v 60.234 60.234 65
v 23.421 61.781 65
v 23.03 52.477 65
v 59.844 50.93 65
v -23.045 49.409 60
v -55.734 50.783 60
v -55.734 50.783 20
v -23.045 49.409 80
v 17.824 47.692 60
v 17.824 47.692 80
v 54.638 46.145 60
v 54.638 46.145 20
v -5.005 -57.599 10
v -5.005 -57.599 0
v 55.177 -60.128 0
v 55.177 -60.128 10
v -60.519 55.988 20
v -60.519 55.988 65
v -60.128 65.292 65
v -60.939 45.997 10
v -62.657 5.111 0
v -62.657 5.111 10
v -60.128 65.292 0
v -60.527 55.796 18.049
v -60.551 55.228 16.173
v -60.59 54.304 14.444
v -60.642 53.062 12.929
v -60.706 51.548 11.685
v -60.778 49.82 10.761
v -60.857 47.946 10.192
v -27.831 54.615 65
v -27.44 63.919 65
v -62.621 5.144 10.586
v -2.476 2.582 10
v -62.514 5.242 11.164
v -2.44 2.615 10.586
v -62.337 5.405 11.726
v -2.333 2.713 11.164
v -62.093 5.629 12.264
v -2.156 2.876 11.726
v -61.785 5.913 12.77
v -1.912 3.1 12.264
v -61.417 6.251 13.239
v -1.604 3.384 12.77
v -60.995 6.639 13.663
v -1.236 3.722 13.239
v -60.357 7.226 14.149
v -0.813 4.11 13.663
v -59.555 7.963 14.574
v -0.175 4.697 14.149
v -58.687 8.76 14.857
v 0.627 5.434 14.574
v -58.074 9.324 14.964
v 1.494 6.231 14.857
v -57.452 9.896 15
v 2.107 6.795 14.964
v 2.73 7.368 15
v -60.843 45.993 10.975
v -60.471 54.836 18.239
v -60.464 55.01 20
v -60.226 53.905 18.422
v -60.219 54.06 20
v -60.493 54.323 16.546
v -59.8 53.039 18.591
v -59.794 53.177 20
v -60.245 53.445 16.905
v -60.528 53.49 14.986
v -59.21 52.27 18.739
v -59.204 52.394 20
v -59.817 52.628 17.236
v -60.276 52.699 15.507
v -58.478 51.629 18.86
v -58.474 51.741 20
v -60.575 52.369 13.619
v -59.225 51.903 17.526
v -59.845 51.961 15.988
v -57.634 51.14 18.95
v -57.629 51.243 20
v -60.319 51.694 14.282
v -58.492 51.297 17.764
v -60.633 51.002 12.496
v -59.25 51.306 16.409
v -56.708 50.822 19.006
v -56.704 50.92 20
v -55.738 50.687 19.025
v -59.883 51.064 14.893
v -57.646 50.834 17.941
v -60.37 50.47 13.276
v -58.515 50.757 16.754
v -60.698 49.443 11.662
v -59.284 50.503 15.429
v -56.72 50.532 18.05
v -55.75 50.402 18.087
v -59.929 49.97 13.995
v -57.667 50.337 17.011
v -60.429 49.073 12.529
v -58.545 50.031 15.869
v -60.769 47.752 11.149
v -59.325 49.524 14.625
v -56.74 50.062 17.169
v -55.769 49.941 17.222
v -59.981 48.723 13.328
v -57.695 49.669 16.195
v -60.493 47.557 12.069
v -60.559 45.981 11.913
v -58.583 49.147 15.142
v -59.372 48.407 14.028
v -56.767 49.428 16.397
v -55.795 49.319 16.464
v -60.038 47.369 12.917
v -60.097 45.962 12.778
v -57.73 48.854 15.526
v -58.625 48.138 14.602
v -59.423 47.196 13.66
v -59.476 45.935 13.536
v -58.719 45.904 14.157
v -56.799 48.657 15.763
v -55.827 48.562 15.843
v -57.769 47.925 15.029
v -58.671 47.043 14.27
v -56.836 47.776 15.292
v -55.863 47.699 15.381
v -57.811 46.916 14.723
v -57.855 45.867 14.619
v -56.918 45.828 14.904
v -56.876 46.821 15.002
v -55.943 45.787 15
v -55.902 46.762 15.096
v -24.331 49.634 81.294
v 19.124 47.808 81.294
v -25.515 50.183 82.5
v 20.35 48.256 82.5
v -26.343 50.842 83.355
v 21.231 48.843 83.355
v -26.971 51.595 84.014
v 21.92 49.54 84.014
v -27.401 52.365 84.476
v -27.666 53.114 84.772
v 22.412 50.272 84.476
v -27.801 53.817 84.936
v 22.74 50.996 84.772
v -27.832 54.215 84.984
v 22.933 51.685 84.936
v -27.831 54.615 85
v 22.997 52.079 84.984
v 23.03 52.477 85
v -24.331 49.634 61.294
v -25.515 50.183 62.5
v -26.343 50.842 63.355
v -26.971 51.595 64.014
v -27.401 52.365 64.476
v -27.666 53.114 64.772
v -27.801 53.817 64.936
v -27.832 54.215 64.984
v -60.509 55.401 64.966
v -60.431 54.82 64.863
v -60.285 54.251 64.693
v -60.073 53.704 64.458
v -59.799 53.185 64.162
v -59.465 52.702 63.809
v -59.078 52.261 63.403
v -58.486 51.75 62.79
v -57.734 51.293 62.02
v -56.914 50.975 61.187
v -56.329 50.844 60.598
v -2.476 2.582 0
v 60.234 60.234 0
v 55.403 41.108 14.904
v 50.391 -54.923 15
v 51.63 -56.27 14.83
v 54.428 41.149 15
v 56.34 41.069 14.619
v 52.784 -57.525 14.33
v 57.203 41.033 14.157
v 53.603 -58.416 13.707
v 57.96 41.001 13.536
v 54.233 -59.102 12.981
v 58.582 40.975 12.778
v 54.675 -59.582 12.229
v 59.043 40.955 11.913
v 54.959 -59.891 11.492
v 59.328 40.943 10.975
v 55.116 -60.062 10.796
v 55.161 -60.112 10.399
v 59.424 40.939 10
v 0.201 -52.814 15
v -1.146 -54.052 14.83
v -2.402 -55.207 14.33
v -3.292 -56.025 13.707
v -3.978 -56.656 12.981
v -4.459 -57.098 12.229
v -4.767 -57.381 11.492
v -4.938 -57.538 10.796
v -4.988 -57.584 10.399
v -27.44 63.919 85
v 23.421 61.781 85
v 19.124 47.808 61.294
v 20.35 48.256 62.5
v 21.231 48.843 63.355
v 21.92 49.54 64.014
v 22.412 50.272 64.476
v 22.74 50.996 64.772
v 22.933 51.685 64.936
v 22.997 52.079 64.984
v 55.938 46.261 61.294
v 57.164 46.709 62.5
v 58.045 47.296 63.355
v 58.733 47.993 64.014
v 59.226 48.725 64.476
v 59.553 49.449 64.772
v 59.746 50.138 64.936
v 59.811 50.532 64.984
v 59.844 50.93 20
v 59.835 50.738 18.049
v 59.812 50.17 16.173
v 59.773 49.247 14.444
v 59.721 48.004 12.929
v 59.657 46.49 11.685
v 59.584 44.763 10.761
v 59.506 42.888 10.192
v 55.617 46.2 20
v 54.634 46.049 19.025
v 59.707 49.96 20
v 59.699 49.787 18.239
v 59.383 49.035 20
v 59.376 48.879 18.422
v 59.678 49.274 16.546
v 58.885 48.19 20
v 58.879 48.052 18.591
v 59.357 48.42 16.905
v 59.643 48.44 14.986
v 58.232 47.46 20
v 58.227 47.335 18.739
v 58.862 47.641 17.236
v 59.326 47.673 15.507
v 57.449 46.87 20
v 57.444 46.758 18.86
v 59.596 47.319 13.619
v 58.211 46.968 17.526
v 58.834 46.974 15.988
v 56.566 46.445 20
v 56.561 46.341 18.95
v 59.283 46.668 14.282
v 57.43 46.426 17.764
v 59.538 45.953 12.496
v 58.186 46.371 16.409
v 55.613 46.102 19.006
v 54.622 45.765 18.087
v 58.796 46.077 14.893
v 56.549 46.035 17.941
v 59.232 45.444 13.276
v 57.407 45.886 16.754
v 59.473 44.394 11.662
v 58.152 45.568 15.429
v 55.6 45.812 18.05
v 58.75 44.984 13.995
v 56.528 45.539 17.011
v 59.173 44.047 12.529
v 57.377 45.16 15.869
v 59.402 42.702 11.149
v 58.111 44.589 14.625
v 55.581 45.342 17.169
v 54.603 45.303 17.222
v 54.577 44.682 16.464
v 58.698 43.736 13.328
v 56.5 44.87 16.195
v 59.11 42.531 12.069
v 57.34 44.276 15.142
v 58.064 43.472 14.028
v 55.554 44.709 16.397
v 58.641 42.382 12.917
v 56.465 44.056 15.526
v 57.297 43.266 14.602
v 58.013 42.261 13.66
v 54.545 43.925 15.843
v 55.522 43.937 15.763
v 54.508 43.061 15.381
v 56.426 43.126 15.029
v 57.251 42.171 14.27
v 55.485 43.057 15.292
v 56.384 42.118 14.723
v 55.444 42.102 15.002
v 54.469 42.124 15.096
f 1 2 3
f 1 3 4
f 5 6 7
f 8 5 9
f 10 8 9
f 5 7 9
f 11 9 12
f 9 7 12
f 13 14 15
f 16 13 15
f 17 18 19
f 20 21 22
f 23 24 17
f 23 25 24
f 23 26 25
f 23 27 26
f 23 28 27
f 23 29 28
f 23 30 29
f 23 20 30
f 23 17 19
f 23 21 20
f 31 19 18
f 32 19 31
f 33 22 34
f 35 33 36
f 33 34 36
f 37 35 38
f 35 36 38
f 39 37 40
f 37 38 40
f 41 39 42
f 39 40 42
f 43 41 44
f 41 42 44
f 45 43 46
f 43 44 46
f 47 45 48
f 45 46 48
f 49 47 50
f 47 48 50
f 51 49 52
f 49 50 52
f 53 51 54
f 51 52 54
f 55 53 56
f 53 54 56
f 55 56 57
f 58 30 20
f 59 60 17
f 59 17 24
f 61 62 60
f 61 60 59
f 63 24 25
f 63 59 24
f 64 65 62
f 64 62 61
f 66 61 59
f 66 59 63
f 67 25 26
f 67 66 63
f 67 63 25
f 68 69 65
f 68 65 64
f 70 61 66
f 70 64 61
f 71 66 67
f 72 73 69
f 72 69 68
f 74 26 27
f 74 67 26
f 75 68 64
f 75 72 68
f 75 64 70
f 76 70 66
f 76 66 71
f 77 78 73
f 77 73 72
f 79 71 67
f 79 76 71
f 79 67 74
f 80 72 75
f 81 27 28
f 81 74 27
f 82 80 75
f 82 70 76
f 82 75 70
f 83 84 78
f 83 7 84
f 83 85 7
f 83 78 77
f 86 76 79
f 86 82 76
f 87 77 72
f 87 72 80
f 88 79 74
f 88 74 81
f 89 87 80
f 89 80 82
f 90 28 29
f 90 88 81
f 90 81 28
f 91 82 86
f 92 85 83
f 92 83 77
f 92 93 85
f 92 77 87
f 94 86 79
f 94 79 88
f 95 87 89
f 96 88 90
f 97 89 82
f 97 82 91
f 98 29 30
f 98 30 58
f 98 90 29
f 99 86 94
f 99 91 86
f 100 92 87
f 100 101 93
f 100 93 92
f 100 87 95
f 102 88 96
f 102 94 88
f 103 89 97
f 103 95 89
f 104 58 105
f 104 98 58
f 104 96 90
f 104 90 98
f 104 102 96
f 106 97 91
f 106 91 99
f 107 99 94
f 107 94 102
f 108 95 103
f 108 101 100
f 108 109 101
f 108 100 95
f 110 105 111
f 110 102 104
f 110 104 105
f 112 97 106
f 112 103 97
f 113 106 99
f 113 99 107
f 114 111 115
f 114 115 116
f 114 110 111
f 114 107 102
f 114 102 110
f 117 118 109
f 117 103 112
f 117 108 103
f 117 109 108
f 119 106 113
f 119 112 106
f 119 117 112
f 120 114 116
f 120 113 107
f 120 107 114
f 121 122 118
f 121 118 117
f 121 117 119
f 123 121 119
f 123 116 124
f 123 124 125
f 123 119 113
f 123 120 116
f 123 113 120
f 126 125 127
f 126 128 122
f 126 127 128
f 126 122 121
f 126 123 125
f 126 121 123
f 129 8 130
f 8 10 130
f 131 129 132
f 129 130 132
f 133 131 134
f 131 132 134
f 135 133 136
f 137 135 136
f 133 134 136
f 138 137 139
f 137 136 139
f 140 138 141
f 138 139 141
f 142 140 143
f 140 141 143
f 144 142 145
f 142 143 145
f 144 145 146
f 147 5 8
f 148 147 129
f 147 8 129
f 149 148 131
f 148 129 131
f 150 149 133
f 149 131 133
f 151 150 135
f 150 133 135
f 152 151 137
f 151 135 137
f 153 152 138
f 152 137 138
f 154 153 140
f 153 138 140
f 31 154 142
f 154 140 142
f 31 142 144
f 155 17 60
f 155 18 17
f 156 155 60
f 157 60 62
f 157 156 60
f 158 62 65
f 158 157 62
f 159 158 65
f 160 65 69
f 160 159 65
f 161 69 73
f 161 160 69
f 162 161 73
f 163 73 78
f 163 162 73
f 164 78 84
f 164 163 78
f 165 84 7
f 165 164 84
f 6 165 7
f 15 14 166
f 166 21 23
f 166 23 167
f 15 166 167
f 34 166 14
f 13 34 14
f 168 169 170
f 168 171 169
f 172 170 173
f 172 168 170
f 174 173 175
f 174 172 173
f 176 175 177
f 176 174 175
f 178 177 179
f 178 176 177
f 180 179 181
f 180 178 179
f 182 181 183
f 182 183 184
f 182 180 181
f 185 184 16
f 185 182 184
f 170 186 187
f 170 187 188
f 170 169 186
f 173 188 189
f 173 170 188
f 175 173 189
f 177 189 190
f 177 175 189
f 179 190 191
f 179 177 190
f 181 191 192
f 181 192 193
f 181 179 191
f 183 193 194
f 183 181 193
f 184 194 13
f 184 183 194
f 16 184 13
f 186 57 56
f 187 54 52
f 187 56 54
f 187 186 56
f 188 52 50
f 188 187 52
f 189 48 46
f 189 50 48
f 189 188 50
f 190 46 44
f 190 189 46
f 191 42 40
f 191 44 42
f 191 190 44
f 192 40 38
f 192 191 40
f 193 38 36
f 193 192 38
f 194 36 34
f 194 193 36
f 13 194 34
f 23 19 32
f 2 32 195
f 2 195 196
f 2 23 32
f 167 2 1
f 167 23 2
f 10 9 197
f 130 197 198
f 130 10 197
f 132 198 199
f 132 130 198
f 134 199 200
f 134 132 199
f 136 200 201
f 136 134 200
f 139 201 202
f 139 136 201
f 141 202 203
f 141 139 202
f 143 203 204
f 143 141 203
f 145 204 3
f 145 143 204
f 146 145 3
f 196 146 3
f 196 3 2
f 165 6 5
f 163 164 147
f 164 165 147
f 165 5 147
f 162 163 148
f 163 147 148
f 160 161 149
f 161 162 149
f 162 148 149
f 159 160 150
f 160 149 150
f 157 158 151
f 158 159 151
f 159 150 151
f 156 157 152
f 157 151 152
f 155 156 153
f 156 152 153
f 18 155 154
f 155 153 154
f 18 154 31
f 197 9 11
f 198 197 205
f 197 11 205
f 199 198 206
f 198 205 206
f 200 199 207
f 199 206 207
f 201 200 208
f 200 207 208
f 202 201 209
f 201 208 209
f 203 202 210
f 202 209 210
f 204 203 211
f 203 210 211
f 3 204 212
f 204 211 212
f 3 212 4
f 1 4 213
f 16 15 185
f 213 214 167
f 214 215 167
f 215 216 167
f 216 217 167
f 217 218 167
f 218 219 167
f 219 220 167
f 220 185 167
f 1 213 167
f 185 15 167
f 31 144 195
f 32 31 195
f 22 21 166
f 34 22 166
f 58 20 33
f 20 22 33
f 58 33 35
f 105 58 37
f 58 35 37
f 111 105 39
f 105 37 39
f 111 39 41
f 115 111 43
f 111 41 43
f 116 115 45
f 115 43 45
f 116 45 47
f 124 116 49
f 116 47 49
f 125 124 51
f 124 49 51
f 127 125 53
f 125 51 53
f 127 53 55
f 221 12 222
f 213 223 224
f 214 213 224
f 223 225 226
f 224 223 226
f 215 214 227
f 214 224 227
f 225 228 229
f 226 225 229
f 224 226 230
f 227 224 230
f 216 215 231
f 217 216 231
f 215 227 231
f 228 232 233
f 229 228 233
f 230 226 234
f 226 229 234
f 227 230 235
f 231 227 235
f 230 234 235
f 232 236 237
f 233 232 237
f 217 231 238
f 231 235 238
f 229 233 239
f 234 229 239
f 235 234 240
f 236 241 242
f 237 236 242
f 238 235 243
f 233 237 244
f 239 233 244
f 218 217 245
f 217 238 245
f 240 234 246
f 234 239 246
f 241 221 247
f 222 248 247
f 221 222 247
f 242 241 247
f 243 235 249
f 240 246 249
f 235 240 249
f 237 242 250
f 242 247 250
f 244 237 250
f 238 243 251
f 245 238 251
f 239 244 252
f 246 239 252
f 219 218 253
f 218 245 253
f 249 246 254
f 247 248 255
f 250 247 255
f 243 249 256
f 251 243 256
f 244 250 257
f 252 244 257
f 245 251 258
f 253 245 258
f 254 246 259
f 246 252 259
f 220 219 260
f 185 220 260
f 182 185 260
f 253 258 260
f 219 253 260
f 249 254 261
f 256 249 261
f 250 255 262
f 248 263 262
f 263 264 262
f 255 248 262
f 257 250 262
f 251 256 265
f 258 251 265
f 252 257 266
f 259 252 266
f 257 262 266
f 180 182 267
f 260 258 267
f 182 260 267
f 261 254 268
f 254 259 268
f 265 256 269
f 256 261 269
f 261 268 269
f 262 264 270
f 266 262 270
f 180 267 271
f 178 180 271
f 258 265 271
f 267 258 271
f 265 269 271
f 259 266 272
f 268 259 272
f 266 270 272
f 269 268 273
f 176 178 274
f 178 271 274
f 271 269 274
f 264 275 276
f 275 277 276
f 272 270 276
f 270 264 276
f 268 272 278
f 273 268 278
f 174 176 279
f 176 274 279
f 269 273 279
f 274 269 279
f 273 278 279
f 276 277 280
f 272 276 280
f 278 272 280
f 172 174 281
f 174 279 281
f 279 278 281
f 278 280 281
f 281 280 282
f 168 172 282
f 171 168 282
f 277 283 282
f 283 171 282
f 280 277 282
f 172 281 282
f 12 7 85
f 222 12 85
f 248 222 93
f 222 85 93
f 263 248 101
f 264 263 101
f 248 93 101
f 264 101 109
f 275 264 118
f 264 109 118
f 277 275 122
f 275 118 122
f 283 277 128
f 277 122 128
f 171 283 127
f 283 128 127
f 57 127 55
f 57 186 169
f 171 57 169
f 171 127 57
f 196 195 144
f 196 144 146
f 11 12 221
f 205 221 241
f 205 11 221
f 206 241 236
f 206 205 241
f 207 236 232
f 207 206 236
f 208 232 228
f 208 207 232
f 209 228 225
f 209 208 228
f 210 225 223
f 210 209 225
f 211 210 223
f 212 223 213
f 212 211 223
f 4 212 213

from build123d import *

# Parameters (mm, degrees)
F1_DEPTH = 15
F0_W     = 120.46892941
F0_H     = 14.3122337759
F2_DEPTH = 65
F3_W     = 50.9056653827
F3_H     = 14.3122337759
F4_DEPTH = 20
F5_R     = 5
F6_ANGLE = 2.4061889728


with BuildPart() as f1:
    # F0 (on Top) → F1 (new body)
    with BuildSketch(Plane.XY):
        Polygon((60.234464705, 45.9222309291), (-60.234464705, 45.9222309291), (-60.234464705, 0), (0, 0), (0, -60.234464705), (60.234464705, -60.234464705), align=None)
    extrude(amount=F1_DEPTH)

    # F0 (on Top) → F2 (join)
    with BuildSketch(Plane.XY):
        with Locations((0, 53.0783478171)):
            Rectangle(F0_W, F0_H)
    extrude(amount=F2_DEPTH)

    # F3 (on face) → F4 (join)
    with BuildSketch(Plane.XY.offset(65)):
        with Locations((-2.0645121112, 53.0783478171)):
            Rectangle(F3_W, F3_H)
    extrude(amount=F4_DEPTH)

    # F5
    f5_edges = [f1.edges().sort_by_distance(p)[0] for p in [
        (0, 45.922231, 15),
        (-60.234465, 45.922231, 40),
        (-43.875905, 45.922231, 65),
        (-27.517345, 45.922231, 75),
        (-2.064512, 45.922231, 85),
        (23.388321, 45.922231, 75),
        (41.811393, 45.922231, 65),
        (60.234465, 45.922231, 40),
        (-60.234465, 22.961115, 15),
        (-30.117232, 0, 15),
        (0, -30.117232, 15),
        (30.117232, -60.234465, 15),
        (60.234465, -7.156117, 15),
    ]]
    fillet(f5_edges, radius=F5_R)


with BuildPart() as f1_1:
    # F6: moved
    add(f1.part.rotate(Axis((60.234464705, 60.234464705, 32.5), (0, 0, -1)), F6_ANGLE))


solid = f1_1.part
